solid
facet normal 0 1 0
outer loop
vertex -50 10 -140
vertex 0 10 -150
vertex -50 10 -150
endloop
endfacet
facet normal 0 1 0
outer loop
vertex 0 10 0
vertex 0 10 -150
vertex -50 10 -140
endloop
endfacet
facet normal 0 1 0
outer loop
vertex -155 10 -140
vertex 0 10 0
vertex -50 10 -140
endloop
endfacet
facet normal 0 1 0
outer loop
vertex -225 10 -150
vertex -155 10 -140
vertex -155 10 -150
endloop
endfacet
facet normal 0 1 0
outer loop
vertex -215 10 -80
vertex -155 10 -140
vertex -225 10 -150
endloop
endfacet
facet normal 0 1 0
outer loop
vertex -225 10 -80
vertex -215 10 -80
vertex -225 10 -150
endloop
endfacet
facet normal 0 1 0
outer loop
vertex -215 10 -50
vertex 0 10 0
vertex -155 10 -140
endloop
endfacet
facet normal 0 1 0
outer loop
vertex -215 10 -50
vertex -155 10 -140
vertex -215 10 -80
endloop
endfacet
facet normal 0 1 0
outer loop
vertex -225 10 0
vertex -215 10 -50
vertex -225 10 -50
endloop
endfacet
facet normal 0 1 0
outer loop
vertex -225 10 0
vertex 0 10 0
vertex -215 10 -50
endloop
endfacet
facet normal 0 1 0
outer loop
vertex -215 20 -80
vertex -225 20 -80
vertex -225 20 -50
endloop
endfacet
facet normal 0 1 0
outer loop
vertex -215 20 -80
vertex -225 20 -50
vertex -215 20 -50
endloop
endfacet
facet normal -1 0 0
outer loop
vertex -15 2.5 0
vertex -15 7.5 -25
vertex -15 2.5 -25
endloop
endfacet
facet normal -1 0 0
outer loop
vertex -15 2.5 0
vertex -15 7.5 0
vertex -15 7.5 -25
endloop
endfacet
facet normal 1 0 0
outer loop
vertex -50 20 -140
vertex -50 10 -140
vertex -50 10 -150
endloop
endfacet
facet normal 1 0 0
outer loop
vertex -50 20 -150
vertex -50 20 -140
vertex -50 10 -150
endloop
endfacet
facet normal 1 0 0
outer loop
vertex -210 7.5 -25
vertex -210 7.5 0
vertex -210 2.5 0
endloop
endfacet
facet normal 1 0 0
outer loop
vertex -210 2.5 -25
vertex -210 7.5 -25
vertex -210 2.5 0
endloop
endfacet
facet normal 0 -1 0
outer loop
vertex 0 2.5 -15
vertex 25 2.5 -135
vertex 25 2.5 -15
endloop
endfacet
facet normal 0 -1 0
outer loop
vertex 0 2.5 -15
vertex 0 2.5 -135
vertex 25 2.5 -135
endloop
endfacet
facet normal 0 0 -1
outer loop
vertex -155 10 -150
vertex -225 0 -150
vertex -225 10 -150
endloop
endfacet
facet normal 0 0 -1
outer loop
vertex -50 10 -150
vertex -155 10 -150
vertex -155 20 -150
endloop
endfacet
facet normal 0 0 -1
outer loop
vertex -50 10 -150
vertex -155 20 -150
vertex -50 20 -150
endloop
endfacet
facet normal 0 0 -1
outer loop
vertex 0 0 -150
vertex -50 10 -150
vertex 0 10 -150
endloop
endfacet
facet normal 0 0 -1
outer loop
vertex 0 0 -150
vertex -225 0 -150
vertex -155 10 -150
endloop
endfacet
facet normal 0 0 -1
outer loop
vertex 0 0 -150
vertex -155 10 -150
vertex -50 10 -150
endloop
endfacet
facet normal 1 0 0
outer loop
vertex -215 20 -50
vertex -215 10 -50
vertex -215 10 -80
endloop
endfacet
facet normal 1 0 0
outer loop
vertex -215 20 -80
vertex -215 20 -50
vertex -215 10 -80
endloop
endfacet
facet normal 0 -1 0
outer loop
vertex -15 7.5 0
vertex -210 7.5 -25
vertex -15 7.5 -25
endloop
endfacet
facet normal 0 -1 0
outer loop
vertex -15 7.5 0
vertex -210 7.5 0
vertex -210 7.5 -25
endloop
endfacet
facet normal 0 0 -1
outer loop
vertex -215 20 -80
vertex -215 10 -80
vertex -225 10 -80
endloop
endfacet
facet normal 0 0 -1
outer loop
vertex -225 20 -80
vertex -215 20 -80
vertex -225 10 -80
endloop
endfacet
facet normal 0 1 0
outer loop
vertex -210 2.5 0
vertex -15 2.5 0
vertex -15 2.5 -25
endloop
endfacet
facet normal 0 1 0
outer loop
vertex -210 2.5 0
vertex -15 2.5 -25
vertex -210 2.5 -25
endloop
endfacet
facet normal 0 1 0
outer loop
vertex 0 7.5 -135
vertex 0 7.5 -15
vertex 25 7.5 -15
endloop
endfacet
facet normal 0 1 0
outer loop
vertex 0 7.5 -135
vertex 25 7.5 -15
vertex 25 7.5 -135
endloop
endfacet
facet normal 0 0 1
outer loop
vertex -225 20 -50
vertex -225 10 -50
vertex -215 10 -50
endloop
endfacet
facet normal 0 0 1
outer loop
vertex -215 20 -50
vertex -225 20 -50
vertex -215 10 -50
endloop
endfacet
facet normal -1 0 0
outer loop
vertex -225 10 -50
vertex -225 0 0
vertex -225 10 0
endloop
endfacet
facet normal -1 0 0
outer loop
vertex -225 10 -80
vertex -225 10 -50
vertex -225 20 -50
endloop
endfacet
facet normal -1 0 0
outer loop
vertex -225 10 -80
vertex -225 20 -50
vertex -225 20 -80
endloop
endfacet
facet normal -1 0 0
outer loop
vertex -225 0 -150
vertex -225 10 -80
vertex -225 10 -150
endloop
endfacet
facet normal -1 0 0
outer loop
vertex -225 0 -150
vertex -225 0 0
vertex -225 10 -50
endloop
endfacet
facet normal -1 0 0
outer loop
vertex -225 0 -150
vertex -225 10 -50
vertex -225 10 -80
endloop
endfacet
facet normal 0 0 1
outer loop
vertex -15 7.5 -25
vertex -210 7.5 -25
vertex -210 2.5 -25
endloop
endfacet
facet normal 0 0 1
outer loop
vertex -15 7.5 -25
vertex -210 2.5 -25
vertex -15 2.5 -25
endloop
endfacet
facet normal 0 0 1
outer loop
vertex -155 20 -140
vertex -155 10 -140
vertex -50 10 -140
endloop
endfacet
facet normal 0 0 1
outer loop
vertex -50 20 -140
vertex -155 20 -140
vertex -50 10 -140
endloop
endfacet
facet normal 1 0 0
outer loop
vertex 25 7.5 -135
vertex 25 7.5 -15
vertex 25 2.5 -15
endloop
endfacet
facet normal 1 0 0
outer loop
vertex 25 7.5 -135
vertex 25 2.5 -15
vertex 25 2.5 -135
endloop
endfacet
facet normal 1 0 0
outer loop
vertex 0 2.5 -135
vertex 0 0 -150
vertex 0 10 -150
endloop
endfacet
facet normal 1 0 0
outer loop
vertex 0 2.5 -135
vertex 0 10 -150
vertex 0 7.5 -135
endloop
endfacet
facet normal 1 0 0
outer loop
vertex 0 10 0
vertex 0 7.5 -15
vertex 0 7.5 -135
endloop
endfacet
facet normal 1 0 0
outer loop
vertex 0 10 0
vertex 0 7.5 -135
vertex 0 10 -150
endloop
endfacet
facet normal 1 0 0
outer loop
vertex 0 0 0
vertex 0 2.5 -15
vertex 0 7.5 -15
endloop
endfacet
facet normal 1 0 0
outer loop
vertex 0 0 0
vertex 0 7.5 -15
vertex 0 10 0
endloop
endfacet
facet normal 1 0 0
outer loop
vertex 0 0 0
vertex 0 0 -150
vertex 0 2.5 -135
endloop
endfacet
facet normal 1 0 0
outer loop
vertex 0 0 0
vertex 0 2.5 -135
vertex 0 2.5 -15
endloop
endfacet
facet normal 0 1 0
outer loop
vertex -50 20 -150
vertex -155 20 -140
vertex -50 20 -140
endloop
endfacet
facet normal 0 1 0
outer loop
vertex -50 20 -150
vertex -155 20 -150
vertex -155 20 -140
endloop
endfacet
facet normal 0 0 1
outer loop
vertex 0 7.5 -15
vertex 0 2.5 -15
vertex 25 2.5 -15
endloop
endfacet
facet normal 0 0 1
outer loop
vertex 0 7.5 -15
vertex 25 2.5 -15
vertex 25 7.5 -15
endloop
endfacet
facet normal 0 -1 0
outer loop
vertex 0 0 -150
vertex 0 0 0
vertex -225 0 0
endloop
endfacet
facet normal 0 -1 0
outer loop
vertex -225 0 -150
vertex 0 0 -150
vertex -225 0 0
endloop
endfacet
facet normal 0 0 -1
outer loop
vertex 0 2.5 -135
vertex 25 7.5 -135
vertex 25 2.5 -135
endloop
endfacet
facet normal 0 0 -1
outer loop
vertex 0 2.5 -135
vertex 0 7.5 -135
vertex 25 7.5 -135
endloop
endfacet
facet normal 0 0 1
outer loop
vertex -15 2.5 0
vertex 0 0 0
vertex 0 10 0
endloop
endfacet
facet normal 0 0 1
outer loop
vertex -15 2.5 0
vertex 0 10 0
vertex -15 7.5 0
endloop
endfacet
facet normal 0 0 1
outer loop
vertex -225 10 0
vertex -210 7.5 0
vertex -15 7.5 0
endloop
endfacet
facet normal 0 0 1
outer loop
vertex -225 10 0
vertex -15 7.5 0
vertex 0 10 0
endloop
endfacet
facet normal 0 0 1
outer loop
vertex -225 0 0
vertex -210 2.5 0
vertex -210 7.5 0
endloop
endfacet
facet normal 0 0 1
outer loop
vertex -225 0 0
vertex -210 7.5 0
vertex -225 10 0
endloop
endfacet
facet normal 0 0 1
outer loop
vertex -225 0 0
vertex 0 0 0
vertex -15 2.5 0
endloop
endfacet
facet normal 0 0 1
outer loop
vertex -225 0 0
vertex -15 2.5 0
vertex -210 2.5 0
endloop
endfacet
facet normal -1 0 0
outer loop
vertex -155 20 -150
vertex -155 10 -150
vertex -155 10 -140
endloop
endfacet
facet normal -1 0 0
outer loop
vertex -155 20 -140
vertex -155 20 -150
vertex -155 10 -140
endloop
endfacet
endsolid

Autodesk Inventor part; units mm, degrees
ref_plane "YZ Plane" through (0, 0, 0) normal (1, 0, 0) x (0, 1, 0)
ref_plane "XZ Plane" through (0, 0, 0) normal (0, 1, 0) x (-1, 0, 0)
ref_plane "XY Plane" through (0, 0, 0) normal (0, 0, 1) x (1, 0, 0)
sketch "Sketch1" plane through (0, 0, 0) normal (0, 1, 0) x (-1, 0, 0)
  line L0 (0, 0) -> (225, 0)
  line L1 (225, 0) -> (225, -150)
  line L2 (225, -150) -> (0, -150)
  line L3 (0, -150) -> (0, 0)
  dimension "d0" = 225
  dimension "d1" = 150
extrude "Extrusion1" add sketch "Sketch1" along normal blind 10
sketch "Sketch2" plane through (0, 0, 0) normal (1, 0, 0) x (0, 0, -1)
  line L0 (0, 7.5) -> (150, 7.5)
  line L1 (150, 7.5) -> (150, 2.5)
  line L2 (150, 2.5) -> (0, 2.5)
  line L3 (0, 2.5) -> (0, 7.5)
  line L4 (150, 7.5) -> (135, 7.5)
  line L5 (135, 7.5) -> (135, 1.8795)
  line L6 (135, 1.8795) -> (150, 1.8795)
  line L7 (150, 1.8795) -> (150, 7.5)
  line L8 (0, 2.5) -> (15, 2.5)
  line L9 (15, 2.5) -> (15, 7.5)
  line L10 (15, 7.5) -> (0, 7.5)
  line L11 (0, 7.5) -> (0, 2.5)
  point P0 (0, 0)
  point P1 (135, 2.5)
  dimension "d4" = 150
  dimension "d5" = 5
  dimension "d6" = 15
  dimension "d7" = 15
sketch "Sketch3" plane through (-225, 0, 0) normal (0, 0, 1) x (1, 0, 0)
  line L0 (0, 7.5) -> (225, 7.5)
  line L1 (225, 7.5) -> (225, 2.5)
  line L2 (225, 2.5) -> (0, 2.5)
  line L3 (0, 2.5) -> (0, 7.5)
  line L4 (225, 7.5) -> (210, 7.5)
  line L5 (210, 7.5) -> (210, 2.5)
  line L6 (210, 2.5) -> (225, 2.5)
  line L7 (225, 2.5) -> (225, 7.5)
  line L8 (0, 7.5) -> (15, 7.5)
  line L9 (15, 7.5) -> (15, 2.5)
  line L10 (15, 2.5) -> (0, 2.5)
  line L11 (0, 2.5) -> (0, 7.5)
  point P0 (225, 0)
  dimension "d8" = 5
  dimension "d9" = 15
  dimension "d10" = 5
  dimension "d11" = 15
  dimension "d12" = 5
extrude "Extrusion2" cut sketch "Sketch3" against normal blind 25 contours L0 L5 L2 L9
extrude "Extrusion3" add sketch "Sketch2" along normal blind 25 contours L0 L5 L2 L9
sketch "Sketch4" plane through (0, 10, 0) normal (0, 1, 0) x (1, 0, 0)
  line L0 (-225, 150) -> (-225, 0) projected
  line L1 (-225, 50) -> (-215, 50)
  line L2 (-215, 50) -> (-215, 80)
  line L3 (-215, 80) -> (-225, 80)
  line L4 (-225, 80) -> (-225, 50)
  line L5 (0, 150) -> (-225, 150) projected
  line L6 (-50, 150) -> (-155, 150)
  line L7 (-155, 150) -> (-155, 140)
  line L8 (-155, 140) -> (-50, 140)
  line L9 (-50, 140) -> (-50, 150)
  point P0 (0, 0)
  dimension "d17" = 10
  dimension "d18" = 30
  dimension "d21" = 105
  dimension "d22" = 10
extrude "Extrusion4" add sketch "Sketch4" along normal blind 10
properties part number "TSU_FM_Floor"
